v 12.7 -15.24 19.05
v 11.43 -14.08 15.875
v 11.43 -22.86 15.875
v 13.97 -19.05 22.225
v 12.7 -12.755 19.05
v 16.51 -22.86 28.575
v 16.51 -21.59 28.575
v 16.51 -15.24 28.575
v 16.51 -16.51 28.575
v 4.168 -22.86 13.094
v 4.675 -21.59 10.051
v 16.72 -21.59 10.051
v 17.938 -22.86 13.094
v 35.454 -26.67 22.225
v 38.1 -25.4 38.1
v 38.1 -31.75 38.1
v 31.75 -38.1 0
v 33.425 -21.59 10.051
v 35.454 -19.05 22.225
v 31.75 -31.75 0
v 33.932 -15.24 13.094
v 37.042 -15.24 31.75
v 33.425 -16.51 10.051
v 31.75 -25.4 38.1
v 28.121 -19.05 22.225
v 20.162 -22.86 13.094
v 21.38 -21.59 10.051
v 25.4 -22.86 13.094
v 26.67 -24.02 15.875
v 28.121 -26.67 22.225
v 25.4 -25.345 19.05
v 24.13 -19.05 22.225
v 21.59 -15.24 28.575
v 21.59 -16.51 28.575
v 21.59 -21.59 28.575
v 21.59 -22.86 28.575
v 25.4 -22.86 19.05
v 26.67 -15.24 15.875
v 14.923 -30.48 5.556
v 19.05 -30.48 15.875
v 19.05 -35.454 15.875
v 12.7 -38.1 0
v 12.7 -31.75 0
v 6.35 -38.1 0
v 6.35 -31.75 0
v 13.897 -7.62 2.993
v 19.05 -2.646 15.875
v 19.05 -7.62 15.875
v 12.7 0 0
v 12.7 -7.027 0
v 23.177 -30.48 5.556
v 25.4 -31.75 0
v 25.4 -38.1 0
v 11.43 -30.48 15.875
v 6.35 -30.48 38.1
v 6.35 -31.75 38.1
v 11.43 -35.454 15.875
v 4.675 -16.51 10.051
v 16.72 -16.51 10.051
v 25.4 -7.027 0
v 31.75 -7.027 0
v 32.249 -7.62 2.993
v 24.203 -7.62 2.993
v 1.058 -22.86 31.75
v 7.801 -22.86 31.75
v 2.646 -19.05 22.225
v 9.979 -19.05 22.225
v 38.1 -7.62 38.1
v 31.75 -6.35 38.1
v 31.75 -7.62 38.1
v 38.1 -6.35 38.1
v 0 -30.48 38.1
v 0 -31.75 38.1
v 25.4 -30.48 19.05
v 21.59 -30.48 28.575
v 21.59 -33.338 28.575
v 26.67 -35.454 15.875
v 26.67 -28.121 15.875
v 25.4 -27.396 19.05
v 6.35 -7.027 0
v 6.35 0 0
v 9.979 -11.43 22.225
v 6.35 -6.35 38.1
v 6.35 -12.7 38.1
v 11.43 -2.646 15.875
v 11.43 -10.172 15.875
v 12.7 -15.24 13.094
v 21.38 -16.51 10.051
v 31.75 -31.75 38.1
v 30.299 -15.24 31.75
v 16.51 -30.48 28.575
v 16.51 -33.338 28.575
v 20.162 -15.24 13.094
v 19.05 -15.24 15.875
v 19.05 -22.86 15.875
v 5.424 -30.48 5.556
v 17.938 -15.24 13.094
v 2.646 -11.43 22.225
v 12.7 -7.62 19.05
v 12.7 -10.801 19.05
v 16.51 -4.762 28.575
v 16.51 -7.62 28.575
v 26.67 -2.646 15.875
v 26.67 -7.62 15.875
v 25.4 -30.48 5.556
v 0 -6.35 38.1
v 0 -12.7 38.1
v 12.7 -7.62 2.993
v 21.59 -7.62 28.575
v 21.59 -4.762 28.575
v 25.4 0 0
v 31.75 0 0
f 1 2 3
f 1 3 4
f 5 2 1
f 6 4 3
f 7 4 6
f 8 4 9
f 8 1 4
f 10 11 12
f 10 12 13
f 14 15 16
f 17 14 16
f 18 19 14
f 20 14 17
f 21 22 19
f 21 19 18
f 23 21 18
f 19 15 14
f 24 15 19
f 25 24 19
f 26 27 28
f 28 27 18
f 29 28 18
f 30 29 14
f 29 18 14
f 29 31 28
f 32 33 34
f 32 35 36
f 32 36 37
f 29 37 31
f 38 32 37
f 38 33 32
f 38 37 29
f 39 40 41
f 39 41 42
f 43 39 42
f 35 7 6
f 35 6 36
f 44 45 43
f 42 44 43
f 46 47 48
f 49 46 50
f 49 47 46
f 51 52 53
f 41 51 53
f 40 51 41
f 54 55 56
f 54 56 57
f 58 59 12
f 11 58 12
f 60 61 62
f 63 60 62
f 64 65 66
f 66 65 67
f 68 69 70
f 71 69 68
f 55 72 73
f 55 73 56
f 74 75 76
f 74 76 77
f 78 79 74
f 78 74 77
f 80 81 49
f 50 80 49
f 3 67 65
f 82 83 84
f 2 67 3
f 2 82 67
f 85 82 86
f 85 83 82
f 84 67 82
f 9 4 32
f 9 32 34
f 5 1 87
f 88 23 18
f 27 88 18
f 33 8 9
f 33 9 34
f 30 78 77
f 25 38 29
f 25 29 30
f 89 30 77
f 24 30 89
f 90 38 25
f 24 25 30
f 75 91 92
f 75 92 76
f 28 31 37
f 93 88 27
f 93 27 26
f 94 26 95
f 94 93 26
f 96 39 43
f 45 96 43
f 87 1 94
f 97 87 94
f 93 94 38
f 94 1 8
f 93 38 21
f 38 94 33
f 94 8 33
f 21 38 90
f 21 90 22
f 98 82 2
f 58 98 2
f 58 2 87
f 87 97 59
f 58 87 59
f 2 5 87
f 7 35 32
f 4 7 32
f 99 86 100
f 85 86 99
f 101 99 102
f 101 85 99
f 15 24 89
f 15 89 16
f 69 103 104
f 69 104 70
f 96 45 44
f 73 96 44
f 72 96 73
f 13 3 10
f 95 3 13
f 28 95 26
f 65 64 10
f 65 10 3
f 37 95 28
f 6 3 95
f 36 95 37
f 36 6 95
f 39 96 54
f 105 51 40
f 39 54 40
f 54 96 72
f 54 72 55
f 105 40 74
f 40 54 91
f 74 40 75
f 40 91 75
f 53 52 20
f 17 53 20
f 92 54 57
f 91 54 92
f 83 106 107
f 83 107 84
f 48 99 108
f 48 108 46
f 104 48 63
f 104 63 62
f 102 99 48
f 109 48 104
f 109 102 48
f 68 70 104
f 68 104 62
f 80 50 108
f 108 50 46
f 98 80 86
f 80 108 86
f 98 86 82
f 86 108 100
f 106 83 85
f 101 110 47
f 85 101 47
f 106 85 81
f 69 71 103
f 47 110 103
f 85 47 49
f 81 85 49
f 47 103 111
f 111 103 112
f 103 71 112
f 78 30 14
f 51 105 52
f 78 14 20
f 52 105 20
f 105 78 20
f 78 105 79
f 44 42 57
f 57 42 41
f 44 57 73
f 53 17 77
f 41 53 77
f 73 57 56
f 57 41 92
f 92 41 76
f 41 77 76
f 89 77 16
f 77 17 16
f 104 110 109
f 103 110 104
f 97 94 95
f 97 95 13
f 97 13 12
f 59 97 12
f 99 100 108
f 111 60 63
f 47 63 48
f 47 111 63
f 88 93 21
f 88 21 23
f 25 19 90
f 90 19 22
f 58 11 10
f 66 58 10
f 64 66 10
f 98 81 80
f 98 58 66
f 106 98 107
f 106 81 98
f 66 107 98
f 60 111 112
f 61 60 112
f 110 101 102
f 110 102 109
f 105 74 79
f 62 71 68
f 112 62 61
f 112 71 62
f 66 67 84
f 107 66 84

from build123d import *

# Parameters (mm, degrees)
F0_W     = 38.1
F0_H     = 38.1
F1_DEPTH = 38.1
F5_DEPTH = 38.1
F7_DEPTH = 38.1
F8_W     = 25.4
F8_H     = 7.62
F9_DEPTH = 38.1


with BuildPart() as f1:
    # F0 (on Front) → F1 (new body)
    with BuildSketch(Plane.XZ):
        with Locations((19.05, 19.05)):
            Rectangle(F0_W, F0_H)
    extrude(amount=F1_DEPTH)

    # F4 (on Front) → F5 (cut)
    with BuildSketch(Plane.XZ):
        Polygon((6.35, 0), (0, 38.1), (0, 0), align=None)
        Polygon((31.75, 38.1), (6.35, 38.1), (11.43, 15.875), (16.51, 28.575), (21.59, 28.575), (26.67, 15.875), align=None)
        Polygon((19.05, 15.875), (12.7, 0), (25.4, 0), align=None)
        Polygon((38.1, 0), (38.1, 38.1), (31.75, 0), align=None)
    extrude(amount=F5_DEPTH, mode=Mode.SUBTRACT)

    # F6 (on offset) → F7 (cut)
    with BuildSketch(Plane.YZ.offset(38.1)):
        Polygon((-38.1, 38.1), (-38.1, 0), (-31.75, 38.1), align=None)
        Polygon((-19.05, 22.225), (-12.7, 38.1), (-25.4, 38.1), align=None)
        Polygon((-31.75, 0), (-7.027086, 0), (-11.43, 22.225), (-16.51, 10.050542), (-21.59, 10.050542), (-26.67, 22.225), align=None)
        Polygon((-6.35, 38.1), (0, 0), (0, 38.1), align=None)
    extrude(amount=-F7_DEPTH, mode=Mode.SUBTRACT)

    # F8 (on offset) → F9 (cut)
    with BuildSketch(Plane.XY.offset(38.1)):
        with Locations((12.7, -26.67)):
            Rectangle(F8_W, F8_H)
        with Locations((25.4, -11.43)):
            Rectangle(F8_W, F8_H)
    extrude(amount=-F9_DEPTH, mode=Mode.SUBTRACT)


solid = f1.part
